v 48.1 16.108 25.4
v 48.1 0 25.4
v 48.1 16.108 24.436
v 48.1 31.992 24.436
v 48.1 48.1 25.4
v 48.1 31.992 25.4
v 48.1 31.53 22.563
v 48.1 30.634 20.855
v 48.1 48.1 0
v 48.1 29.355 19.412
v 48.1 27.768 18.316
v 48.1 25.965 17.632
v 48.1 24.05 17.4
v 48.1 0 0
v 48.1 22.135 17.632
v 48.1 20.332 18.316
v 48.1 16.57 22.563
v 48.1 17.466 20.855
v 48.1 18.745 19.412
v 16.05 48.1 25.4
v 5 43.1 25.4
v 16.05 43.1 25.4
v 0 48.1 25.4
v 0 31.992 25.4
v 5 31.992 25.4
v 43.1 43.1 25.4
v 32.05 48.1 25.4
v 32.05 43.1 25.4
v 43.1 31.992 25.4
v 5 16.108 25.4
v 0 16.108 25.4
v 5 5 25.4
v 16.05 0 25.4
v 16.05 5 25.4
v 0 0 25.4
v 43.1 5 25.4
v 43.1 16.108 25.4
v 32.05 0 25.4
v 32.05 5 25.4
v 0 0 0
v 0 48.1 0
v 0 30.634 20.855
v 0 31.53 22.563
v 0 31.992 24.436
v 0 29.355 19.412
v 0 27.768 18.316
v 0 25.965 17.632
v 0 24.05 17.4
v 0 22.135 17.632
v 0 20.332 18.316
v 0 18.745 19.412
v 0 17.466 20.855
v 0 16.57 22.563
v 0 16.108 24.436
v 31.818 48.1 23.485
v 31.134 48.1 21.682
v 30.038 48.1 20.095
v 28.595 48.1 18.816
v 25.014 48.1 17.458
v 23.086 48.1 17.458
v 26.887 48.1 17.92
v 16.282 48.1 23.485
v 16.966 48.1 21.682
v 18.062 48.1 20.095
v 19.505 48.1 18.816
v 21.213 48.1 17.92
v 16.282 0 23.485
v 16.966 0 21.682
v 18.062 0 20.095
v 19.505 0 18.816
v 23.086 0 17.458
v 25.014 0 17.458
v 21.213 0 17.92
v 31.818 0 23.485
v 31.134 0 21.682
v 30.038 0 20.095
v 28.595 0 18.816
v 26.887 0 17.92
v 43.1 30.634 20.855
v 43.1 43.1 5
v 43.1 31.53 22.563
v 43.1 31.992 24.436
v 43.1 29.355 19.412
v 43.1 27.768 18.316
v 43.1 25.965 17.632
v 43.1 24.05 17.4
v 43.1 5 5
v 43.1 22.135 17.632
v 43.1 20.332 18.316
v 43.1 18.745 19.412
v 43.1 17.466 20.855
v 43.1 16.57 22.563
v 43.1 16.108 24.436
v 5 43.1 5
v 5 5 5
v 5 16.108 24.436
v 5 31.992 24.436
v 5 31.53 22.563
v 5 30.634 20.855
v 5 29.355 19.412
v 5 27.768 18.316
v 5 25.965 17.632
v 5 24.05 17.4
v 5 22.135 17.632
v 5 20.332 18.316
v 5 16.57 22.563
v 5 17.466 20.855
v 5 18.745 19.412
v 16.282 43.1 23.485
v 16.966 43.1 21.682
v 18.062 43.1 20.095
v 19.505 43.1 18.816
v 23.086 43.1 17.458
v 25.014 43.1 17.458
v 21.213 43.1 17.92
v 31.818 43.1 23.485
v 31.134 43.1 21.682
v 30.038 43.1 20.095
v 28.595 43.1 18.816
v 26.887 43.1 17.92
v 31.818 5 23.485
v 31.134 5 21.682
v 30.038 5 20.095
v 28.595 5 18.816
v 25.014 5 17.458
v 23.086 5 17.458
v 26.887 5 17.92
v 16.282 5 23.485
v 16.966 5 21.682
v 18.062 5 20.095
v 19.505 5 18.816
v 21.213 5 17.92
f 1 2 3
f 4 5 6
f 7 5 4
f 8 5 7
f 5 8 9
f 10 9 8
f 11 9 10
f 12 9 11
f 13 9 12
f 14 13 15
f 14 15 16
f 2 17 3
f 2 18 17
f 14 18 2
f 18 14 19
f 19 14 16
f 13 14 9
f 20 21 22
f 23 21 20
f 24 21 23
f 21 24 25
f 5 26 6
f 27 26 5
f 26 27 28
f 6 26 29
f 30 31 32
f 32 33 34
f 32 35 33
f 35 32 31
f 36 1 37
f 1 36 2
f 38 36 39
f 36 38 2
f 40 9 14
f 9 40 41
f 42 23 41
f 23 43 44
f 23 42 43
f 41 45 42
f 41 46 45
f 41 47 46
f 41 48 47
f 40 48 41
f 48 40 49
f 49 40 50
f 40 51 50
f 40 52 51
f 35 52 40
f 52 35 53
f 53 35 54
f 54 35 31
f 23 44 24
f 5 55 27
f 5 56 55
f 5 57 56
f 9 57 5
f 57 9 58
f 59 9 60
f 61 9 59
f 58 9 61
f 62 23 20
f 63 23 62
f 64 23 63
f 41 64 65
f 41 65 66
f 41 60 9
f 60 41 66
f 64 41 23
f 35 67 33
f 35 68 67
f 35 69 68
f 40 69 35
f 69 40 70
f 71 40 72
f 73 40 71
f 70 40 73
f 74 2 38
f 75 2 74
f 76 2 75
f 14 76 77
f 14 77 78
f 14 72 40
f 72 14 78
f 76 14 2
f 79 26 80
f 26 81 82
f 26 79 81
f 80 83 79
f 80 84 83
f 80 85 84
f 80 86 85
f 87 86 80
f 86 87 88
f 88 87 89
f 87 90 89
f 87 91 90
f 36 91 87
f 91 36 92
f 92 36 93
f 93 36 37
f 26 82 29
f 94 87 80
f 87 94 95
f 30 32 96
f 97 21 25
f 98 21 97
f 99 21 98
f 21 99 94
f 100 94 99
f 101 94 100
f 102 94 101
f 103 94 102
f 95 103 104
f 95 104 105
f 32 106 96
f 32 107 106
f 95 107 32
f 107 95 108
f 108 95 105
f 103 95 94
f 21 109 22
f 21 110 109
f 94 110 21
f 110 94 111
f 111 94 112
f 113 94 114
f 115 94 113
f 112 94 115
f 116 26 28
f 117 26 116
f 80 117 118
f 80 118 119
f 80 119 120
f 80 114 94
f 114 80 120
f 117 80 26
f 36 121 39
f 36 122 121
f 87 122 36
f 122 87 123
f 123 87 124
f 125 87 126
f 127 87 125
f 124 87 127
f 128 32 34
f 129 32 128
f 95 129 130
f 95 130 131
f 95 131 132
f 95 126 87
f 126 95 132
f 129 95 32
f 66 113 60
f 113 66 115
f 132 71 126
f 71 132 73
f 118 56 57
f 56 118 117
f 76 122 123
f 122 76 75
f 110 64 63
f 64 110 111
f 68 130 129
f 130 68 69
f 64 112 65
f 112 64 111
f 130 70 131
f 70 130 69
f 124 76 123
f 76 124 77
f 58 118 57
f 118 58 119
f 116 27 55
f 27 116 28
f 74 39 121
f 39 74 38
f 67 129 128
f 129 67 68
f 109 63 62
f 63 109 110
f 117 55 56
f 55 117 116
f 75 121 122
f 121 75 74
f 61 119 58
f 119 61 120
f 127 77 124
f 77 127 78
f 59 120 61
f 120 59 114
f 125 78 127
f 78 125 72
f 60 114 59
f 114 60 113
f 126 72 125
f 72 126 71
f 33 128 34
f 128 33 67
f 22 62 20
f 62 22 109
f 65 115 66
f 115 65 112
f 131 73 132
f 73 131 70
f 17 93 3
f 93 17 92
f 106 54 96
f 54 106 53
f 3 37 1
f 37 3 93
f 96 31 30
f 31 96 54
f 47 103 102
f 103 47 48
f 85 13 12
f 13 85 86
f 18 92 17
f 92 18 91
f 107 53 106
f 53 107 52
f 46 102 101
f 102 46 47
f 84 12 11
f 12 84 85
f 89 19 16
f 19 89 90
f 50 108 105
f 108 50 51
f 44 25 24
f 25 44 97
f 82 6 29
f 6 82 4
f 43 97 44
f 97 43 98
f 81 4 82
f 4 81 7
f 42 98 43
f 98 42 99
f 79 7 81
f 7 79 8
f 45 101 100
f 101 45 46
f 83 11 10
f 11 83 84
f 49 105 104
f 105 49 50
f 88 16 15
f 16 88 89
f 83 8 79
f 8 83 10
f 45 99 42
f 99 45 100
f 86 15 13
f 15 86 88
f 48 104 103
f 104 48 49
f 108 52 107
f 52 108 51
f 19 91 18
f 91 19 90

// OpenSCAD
bolt = 5/16 * 25.4;
wall = 5;

module receiver(size){
    difference(){
        cube([size+wall*2,size+wall*2,25.4]);
        translate([wall,wall,wall]) cube([size,size,25.4]);
    }
}

difference(){
    receiver(1.5*25.4);
    
    translate([(1.5*25.4)/2+wall, 1.5*25.4 + wall*2, 25.4])
    rotate([90,0,0])
    cylinder(r=8, h=1.5*25.4+wall*2);
    
    translate([0, (1.5*25.4)/2+wall, 25.4])
    rotate([0,90,0])
    cylinder(r=8, h=1.5*25.4+wall*2);
}
